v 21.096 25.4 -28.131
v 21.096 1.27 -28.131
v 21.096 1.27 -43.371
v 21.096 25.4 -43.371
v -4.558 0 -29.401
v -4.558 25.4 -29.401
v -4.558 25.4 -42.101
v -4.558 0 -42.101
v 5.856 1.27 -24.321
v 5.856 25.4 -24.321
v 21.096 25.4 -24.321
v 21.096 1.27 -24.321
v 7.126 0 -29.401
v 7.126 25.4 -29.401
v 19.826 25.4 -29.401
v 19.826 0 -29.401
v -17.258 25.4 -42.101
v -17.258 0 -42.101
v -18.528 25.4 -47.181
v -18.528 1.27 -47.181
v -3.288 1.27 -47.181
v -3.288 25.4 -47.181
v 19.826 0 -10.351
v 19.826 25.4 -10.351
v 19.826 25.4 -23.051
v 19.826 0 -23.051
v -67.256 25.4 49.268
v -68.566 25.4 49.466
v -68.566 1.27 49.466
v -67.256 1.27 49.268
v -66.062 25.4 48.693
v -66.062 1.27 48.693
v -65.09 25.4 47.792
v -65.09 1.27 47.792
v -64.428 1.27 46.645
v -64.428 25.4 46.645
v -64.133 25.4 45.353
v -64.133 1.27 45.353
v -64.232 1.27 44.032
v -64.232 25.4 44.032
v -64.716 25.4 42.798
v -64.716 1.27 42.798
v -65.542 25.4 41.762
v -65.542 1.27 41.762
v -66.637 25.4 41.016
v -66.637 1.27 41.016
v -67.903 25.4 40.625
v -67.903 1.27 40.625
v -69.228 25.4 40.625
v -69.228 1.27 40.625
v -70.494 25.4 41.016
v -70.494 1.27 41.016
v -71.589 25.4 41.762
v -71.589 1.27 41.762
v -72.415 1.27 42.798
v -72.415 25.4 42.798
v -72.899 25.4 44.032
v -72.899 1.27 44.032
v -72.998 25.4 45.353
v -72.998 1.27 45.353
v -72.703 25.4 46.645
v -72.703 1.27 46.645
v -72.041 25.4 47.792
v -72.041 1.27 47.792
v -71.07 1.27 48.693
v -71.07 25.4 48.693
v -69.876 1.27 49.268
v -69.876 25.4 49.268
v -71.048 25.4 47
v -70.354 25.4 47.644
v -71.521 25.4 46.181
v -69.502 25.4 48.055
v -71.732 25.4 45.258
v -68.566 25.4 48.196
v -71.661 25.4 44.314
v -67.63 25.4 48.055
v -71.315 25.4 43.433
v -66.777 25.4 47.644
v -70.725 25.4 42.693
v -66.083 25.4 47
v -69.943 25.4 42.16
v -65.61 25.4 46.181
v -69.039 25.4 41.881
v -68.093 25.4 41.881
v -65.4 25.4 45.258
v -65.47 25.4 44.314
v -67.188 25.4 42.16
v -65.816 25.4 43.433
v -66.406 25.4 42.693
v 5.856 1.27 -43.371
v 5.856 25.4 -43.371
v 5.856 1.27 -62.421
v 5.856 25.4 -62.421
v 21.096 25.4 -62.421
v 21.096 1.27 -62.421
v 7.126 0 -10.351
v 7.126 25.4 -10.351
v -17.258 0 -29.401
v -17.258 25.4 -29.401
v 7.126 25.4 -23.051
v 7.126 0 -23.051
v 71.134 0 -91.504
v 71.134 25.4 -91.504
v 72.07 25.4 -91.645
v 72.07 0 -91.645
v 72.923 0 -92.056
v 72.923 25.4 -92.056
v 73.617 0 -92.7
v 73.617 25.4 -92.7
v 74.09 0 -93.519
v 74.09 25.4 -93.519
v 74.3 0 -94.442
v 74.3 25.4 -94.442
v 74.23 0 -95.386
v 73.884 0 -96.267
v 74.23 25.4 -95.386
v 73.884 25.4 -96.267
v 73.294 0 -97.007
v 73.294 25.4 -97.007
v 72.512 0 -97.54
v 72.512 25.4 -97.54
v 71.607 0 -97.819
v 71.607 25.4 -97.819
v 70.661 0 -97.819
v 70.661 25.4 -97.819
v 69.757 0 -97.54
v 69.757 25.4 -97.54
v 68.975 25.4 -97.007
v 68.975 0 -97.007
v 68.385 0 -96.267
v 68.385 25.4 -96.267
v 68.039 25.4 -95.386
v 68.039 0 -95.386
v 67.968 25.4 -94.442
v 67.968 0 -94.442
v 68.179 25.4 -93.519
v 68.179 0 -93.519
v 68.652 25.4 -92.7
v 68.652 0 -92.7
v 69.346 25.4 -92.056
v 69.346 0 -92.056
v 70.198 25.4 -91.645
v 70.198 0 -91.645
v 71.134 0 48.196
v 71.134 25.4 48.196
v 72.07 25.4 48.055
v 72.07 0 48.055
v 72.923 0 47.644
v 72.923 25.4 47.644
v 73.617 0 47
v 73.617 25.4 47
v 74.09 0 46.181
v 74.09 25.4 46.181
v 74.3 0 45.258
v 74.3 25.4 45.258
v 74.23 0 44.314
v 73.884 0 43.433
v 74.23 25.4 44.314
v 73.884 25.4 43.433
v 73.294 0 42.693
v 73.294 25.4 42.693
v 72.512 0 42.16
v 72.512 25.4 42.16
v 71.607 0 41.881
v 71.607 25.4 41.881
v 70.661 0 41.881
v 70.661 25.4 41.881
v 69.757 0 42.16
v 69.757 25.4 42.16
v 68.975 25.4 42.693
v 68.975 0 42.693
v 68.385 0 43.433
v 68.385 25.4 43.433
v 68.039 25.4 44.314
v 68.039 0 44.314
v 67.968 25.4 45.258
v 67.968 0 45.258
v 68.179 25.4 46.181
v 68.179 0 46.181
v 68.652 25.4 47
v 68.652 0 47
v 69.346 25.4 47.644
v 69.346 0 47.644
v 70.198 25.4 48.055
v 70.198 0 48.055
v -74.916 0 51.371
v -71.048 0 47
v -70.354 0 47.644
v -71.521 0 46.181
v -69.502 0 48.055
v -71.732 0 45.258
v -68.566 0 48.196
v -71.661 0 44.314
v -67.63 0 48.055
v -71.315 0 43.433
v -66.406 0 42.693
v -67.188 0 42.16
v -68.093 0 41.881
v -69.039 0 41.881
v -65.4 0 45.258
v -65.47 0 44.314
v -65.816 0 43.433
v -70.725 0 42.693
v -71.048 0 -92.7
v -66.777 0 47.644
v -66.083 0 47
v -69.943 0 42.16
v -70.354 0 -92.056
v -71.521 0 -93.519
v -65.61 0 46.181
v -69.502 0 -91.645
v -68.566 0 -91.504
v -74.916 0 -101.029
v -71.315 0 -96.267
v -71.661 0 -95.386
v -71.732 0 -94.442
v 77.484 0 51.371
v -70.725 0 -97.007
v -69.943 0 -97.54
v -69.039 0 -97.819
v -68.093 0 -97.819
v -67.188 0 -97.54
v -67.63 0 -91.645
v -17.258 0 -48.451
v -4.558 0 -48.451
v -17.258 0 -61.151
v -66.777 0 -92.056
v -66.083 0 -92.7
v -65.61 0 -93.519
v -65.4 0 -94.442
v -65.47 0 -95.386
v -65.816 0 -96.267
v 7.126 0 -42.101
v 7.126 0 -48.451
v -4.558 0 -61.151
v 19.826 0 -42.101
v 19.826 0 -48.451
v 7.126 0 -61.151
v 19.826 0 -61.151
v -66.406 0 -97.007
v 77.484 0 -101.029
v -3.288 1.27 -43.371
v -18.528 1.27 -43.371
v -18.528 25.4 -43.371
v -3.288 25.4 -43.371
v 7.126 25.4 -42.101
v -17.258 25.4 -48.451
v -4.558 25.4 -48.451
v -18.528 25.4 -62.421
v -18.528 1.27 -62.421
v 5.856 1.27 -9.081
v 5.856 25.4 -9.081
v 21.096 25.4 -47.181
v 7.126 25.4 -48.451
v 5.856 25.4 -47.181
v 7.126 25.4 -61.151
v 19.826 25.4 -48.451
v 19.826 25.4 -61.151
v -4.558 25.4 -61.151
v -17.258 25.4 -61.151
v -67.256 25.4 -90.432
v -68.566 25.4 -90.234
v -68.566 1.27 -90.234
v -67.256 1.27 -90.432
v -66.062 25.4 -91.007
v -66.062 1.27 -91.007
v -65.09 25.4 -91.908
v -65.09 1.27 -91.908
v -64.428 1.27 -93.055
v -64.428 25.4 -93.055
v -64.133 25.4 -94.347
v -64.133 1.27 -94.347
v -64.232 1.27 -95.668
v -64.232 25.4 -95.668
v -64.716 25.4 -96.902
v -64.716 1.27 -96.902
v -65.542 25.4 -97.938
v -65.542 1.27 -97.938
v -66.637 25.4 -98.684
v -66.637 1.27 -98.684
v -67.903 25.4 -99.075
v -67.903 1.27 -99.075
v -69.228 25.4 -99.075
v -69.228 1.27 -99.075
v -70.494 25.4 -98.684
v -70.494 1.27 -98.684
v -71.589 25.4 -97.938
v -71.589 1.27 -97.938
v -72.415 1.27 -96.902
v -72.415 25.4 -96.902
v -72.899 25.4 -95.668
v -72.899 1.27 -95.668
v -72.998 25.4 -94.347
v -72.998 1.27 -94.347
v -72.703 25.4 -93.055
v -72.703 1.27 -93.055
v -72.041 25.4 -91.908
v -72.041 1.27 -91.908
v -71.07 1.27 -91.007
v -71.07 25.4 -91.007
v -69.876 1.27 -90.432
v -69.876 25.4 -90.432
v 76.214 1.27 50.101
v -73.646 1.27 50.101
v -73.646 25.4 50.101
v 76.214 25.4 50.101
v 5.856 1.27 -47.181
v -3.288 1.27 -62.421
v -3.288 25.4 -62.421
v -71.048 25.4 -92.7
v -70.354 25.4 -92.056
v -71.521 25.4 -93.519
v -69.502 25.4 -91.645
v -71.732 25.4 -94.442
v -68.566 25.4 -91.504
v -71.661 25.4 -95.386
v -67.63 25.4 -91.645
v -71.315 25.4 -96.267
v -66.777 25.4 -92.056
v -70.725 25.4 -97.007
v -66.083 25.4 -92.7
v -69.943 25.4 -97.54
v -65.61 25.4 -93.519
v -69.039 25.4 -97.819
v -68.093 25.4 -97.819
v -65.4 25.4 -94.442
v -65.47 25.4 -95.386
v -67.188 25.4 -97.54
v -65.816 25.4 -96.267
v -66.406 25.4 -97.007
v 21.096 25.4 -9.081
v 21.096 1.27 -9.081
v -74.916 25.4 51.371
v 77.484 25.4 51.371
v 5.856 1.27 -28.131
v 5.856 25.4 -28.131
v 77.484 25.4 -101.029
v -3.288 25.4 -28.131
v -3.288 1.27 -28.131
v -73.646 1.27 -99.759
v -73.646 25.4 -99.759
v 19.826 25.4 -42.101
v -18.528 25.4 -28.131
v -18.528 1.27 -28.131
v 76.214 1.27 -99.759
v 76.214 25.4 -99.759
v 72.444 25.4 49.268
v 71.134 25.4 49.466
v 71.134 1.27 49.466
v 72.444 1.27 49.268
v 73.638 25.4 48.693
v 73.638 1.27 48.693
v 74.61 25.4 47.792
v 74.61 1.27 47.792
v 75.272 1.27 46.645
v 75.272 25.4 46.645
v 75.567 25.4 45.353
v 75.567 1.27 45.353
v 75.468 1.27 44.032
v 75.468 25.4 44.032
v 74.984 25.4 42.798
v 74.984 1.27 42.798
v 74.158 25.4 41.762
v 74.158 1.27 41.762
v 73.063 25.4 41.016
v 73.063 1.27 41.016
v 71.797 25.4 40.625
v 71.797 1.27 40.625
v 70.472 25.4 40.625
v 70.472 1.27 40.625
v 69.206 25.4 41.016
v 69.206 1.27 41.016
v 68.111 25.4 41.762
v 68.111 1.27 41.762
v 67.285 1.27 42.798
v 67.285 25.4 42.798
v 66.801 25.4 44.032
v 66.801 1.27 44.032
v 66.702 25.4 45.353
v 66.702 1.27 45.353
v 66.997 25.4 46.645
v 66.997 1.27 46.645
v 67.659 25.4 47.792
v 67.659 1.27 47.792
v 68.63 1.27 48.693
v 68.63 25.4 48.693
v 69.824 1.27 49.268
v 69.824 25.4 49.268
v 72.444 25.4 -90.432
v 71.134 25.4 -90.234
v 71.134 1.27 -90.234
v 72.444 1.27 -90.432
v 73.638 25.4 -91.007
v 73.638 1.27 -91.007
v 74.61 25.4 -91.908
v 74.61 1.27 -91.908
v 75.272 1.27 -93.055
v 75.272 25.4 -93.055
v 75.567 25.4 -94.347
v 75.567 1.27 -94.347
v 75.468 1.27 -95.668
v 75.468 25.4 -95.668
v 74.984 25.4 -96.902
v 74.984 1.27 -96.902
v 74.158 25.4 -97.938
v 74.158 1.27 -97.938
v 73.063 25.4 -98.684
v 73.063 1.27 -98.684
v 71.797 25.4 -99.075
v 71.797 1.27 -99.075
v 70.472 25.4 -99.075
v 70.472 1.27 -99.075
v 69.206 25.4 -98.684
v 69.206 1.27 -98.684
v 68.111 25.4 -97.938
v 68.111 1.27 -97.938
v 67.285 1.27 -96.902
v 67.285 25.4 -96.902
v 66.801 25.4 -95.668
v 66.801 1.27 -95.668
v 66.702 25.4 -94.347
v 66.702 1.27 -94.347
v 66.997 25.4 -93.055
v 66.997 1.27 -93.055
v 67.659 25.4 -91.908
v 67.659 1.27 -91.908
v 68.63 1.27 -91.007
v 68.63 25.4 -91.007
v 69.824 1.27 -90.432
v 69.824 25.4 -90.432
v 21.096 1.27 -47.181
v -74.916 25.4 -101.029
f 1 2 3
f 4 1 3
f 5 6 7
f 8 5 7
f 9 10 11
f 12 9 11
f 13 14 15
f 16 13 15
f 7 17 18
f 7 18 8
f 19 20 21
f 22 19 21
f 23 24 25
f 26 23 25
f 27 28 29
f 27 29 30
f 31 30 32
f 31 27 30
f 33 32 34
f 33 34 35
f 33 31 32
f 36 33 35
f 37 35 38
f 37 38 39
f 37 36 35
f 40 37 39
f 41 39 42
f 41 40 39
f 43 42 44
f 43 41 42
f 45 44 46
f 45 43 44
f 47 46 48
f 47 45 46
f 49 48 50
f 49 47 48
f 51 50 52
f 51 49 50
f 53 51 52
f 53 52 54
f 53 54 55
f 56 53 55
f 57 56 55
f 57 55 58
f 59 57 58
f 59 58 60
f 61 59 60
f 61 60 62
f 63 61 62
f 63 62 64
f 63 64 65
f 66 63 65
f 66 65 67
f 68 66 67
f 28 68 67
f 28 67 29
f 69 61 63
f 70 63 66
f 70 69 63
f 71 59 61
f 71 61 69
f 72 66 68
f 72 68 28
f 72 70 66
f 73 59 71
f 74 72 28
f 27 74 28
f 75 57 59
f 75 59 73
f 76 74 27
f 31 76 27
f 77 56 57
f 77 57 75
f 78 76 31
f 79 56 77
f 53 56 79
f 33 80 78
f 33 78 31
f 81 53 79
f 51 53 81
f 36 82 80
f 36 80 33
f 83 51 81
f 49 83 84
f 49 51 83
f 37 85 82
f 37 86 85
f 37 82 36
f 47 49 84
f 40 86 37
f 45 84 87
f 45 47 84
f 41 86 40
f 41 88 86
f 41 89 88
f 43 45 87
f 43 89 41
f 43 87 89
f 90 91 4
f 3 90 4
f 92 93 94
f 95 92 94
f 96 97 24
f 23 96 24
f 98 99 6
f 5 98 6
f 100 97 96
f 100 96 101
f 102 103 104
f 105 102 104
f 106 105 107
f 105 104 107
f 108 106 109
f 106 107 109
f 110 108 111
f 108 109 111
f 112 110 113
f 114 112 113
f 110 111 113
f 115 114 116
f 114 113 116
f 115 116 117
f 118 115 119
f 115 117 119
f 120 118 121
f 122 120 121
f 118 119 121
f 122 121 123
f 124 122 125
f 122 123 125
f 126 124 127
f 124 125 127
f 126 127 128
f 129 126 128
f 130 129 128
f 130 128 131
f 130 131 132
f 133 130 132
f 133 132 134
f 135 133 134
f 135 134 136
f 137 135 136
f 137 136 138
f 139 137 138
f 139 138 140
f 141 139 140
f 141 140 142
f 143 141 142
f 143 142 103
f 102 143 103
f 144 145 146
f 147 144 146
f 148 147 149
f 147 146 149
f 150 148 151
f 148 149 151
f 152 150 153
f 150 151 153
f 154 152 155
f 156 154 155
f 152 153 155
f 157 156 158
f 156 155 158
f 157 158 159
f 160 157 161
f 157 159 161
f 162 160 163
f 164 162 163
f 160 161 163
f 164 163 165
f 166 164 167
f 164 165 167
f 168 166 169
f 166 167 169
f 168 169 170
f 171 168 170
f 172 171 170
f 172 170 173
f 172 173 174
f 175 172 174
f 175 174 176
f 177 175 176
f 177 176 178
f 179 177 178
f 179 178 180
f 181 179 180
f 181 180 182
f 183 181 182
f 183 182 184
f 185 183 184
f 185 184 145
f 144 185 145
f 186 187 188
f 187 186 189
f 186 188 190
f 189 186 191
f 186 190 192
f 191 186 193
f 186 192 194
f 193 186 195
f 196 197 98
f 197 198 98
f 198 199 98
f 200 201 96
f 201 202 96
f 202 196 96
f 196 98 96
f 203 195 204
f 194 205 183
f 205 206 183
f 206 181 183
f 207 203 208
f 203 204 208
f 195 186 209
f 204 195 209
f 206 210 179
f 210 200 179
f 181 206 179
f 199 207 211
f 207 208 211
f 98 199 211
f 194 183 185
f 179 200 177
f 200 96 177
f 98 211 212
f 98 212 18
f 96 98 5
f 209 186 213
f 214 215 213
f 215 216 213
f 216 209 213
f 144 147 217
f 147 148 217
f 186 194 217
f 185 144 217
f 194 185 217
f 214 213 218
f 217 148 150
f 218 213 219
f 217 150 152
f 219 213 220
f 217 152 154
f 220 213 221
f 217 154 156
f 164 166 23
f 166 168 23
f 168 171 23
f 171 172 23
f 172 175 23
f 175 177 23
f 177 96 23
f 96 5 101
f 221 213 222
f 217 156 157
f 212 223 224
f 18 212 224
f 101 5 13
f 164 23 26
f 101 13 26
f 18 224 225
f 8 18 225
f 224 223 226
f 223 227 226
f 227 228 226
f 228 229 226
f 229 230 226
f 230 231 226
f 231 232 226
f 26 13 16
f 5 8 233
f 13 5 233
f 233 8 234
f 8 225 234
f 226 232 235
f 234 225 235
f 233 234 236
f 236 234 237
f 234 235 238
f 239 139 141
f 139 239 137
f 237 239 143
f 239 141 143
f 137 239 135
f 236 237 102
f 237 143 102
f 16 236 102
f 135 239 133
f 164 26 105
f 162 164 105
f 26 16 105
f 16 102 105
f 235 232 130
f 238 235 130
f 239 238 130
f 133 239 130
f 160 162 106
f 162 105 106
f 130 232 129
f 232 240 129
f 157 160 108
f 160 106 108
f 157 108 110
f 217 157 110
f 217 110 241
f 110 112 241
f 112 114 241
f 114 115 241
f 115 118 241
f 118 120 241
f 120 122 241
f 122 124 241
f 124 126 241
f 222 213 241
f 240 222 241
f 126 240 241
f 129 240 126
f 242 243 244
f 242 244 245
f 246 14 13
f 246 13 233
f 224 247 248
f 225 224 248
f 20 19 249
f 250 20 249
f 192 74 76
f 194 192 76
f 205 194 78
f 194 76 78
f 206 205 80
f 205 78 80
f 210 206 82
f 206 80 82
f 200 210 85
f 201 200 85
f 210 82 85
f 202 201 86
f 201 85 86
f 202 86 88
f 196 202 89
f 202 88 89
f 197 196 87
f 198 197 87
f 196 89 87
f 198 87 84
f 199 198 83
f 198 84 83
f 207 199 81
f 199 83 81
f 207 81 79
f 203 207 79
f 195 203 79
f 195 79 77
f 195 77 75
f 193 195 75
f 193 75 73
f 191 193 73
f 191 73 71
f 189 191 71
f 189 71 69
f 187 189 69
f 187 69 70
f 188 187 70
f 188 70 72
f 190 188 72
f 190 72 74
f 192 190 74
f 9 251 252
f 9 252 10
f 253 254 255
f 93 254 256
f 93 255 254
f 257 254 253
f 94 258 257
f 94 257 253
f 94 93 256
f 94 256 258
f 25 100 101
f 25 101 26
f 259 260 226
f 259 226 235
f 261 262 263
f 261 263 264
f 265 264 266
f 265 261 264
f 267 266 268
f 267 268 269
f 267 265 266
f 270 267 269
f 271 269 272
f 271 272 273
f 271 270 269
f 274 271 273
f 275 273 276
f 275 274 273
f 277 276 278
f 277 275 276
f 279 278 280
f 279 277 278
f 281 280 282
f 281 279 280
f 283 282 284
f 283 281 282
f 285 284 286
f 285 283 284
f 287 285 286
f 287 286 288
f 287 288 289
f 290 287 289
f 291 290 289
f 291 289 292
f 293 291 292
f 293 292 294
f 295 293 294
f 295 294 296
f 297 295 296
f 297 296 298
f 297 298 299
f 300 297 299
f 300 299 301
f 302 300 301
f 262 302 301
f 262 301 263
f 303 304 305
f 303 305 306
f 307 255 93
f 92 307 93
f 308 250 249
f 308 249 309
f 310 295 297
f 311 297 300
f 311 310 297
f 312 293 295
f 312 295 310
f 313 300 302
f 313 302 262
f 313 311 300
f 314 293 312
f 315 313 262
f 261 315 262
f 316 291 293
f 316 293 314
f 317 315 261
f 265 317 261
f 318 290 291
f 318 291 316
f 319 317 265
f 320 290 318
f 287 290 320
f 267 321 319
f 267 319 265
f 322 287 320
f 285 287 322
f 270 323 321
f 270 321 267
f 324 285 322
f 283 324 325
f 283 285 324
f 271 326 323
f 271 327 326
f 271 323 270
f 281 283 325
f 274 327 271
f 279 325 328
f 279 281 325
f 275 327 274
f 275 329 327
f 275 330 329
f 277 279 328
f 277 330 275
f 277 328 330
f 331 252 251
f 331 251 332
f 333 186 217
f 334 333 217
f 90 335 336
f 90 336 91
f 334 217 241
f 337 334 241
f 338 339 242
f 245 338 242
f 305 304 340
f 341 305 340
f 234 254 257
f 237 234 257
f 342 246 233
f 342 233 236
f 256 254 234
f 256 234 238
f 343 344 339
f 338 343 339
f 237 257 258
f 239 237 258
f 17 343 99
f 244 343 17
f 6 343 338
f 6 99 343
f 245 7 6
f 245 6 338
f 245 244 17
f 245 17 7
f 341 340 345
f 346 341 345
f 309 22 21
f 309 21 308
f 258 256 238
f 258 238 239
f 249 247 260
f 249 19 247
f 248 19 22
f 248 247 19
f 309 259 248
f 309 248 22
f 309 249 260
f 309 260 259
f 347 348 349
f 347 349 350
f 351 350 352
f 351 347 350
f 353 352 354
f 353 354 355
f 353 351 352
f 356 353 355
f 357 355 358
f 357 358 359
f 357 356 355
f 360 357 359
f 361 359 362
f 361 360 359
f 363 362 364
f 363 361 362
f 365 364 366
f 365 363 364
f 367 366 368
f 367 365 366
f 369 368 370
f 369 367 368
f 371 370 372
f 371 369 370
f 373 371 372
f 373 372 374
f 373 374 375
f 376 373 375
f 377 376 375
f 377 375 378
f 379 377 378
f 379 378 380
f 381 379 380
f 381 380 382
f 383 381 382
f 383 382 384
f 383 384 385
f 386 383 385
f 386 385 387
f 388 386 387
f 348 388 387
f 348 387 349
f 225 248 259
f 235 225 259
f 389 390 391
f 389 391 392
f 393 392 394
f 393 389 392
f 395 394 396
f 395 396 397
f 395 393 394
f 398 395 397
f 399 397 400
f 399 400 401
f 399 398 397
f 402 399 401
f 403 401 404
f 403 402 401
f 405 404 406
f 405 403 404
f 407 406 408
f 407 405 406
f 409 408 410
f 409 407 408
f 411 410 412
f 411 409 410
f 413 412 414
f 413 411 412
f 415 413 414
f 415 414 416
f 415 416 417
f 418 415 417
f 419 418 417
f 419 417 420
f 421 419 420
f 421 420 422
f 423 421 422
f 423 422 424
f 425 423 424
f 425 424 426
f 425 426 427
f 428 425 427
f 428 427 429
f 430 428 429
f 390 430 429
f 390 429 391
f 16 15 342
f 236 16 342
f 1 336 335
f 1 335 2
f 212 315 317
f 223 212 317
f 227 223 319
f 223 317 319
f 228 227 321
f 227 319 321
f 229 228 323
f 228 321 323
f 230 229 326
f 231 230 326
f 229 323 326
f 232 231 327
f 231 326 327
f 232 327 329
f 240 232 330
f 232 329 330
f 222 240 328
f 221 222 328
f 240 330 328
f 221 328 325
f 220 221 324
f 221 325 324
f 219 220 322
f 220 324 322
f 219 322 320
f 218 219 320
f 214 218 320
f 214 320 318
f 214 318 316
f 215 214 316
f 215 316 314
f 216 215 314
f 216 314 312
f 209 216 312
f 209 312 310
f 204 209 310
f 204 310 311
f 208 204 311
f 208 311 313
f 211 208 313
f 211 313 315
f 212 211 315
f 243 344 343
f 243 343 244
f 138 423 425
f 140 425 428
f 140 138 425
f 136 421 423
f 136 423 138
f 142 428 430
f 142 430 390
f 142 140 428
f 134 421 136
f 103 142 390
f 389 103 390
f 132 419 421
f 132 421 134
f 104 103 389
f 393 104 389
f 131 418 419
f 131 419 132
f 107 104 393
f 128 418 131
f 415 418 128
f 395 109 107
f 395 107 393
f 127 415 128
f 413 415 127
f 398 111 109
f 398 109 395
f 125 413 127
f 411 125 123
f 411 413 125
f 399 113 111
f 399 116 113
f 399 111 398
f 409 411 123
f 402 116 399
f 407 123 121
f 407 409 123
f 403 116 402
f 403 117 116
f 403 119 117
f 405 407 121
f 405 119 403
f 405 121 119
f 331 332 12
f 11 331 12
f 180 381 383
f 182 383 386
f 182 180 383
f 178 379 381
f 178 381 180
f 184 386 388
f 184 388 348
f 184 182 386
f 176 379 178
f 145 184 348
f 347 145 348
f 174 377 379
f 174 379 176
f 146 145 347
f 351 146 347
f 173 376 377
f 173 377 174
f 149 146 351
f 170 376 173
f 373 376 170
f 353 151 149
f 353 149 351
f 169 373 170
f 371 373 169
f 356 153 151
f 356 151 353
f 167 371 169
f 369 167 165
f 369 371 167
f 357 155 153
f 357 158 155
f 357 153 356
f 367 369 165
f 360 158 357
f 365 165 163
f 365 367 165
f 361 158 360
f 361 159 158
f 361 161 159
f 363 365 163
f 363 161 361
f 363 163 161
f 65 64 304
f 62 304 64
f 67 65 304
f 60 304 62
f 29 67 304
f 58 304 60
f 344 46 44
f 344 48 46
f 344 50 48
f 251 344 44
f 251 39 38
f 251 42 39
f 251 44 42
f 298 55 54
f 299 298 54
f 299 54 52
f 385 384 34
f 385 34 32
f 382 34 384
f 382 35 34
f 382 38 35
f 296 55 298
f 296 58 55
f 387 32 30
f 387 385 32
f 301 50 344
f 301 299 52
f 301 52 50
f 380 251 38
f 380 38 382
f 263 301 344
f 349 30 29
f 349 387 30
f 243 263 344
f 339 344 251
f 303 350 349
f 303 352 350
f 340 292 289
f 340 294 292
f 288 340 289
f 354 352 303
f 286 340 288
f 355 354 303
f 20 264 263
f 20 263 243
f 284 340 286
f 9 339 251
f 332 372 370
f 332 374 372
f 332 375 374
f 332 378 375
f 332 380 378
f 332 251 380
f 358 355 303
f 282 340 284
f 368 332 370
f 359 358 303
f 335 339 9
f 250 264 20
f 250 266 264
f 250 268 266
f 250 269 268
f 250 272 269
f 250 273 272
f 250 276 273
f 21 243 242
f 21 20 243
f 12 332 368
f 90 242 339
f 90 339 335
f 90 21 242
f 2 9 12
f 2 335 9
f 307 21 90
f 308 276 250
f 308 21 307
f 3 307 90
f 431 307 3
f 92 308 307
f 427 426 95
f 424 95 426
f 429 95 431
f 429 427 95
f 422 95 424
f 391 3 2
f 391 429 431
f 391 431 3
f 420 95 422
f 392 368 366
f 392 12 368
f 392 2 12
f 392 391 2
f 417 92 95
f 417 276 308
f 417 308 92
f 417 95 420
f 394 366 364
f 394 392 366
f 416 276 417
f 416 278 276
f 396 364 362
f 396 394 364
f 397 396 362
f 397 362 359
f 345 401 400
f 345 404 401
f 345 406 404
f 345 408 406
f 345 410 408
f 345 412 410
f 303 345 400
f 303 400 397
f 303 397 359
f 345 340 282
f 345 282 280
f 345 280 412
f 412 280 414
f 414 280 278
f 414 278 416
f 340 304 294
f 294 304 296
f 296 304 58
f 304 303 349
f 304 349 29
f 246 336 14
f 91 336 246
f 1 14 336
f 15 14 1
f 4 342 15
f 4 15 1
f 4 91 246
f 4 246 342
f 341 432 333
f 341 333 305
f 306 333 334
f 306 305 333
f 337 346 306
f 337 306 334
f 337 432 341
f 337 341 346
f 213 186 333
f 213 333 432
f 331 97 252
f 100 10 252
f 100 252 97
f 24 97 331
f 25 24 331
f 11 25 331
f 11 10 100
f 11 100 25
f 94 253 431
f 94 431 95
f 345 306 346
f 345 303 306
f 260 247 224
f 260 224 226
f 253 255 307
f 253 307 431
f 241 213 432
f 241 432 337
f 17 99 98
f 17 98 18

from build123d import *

# Parameters (mm, degrees)
SKETCH1_W           = 152.4
SKETCH1_H           = 152.4
BOSS_EXTRUDE1_DEPTH = 25.4
SKETCH3_R           = 3.175
CUT_EXTRUDE1_DEPTH  = 130.830173774
SKETCH4_W           = 12.7
SKETCH4_H           = 12.7
CUT_EXTRUDE2_DEPTH  = 130.830173774
SHELL1_T            = -1.27


with BuildPart() as part:
    # Sketch1 → Boss-Extrude1 (new body)
    with BuildSketch(Plane(origin=(0, 0, 0), x_dir=(1, 0, 0), z_dir=(0, 1, 0))):
        with Locations((1.284269663, 24.829213483)):
            Rectangle(SKETCH1_W, SKETCH1_H)
    extrude(amount=BOSS_EXTRUDE1_DEPTH)

    # Sketch3 → Cut-Extrude1 (cut, through all)
    with BuildSketch(Plane(origin=(0, 25.4, 0), x_dir=(1, 0, 0), z_dir=(0, 1, 0))):
        with Locations(Location((-68.565730337, 94.679213483, 0), (0, 0, 270))):
            Circle(SKETCH3_R)
        with Locations(Location((71.134269663, 94.679213483, 0), (0, 0, 270))):
            Circle(SKETCH3_R)
        with Locations(Location((-68.565730337, -45.020786517, 0), (0, 0, 270))):
            Circle(SKETCH3_R)
        with Locations(Location((71.134269663, -45.020786517, 0), (0, 0, 270))):
            Circle(SKETCH3_R)
    extrude(amount=-CUT_EXTRUDE1_DEPTH, mode=Mode.SUBTRACT)

    # Sketch4 → Cut-Extrude2 (cut, through all)
    with BuildSketch(Plane(origin=(0, 25.4, 0), x_dir=(1, 0, 0), z_dir=(0, 1, 0))):
        with Locations((-10.907730337, 54.801213483)):
            Rectangle(SKETCH4_W, SKETCH4_H)
        with Locations((13.476269663, 54.801213483)):
            Rectangle(SKETCH4_W, SKETCH4_H)
        with Locations((-10.907730337, 35.751213483)):
            Rectangle(SKETCH4_W, SKETCH4_H)
        with Locations((13.476269663, 35.751213483)):
            Rectangle(SKETCH4_W, SKETCH4_H)
        with Locations((13.476269663, 16.701213483)):
            Rectangle(SKETCH4_W, SKETCH4_H)
    extrude(amount=-CUT_EXTRUDE2_DEPTH, mode=Mode.SUBTRACT)

    # Shell1
    shell1_openings = [part.faces().sort_by_distance(p)[0] for p in [
        (-10.907730337, 25.4, -35.751213483),
    ]]
    offset(amount=SHELL1_T, openings=shell1_openings, kind=Kind.INTERSECTION)


solid = part.part
